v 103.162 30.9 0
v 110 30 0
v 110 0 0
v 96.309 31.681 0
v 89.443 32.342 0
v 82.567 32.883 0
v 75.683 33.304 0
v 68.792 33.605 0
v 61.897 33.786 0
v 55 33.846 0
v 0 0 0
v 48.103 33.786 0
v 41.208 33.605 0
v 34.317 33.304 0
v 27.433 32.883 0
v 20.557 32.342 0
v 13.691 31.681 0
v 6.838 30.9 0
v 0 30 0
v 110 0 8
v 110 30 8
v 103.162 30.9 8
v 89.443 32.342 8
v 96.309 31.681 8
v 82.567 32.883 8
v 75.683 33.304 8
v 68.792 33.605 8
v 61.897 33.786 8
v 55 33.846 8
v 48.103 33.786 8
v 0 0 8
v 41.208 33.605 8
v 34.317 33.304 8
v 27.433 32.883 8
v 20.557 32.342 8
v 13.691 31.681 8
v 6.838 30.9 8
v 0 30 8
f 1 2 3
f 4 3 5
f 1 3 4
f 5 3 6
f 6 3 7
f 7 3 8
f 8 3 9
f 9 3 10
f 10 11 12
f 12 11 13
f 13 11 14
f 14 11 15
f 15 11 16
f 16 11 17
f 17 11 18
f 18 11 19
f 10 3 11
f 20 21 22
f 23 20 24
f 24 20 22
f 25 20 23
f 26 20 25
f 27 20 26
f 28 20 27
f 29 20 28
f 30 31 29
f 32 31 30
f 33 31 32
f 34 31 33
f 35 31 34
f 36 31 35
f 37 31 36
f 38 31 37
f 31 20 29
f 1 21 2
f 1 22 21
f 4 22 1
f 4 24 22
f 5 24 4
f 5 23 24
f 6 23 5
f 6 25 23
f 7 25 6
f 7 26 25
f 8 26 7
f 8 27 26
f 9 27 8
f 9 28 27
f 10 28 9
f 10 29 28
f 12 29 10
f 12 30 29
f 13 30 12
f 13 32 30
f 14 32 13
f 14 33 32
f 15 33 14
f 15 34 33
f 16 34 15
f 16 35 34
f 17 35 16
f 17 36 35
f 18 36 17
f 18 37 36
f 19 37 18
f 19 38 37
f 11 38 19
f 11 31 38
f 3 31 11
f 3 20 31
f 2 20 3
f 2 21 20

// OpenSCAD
$fn = 32;

// ----------------------------------------------------------------------
// Arc profile plate: crown, 19 points
// ----------------------------------------------------------------------

// --- parameters (mm) ---
bar_l = 110;              // bar length, X
bar_w = 30;               // bar height at the ends, Y
arc_r = 395.19;           // radius of the crown arc
arc_angle = 16;           // crown arc angle, degrees
crown_rise = 3.85;        // rise of the crown over the ends
arc_step = 1;             // sampling step of the crown arc, degrees
plate_t = 8;              // plate thickness, Z

bbox_y = bar_w + crown_rise;  // full height with the crown

profile = [[110, 30], [103.162, 30.9], [96.309, 31.681], [89.443, 32.342], [82.567, 32.883], [75.683, 33.304], [68.792, 33.605], [61.897, 33.786], [55, 33.846], [48.103, 33.786], [41.208, 33.605], [34.317, 33.304], [27.433, 32.883], [20.557, 32.342], [13.691, 31.681], [6.838, 30.9], [0, 30], [0, 0], [110, 0]];  // primary outline, 19 points, counter clockwise

// --- the one profile operation ---
linear_extrude(height = plate_t) polygon(points = profile);
